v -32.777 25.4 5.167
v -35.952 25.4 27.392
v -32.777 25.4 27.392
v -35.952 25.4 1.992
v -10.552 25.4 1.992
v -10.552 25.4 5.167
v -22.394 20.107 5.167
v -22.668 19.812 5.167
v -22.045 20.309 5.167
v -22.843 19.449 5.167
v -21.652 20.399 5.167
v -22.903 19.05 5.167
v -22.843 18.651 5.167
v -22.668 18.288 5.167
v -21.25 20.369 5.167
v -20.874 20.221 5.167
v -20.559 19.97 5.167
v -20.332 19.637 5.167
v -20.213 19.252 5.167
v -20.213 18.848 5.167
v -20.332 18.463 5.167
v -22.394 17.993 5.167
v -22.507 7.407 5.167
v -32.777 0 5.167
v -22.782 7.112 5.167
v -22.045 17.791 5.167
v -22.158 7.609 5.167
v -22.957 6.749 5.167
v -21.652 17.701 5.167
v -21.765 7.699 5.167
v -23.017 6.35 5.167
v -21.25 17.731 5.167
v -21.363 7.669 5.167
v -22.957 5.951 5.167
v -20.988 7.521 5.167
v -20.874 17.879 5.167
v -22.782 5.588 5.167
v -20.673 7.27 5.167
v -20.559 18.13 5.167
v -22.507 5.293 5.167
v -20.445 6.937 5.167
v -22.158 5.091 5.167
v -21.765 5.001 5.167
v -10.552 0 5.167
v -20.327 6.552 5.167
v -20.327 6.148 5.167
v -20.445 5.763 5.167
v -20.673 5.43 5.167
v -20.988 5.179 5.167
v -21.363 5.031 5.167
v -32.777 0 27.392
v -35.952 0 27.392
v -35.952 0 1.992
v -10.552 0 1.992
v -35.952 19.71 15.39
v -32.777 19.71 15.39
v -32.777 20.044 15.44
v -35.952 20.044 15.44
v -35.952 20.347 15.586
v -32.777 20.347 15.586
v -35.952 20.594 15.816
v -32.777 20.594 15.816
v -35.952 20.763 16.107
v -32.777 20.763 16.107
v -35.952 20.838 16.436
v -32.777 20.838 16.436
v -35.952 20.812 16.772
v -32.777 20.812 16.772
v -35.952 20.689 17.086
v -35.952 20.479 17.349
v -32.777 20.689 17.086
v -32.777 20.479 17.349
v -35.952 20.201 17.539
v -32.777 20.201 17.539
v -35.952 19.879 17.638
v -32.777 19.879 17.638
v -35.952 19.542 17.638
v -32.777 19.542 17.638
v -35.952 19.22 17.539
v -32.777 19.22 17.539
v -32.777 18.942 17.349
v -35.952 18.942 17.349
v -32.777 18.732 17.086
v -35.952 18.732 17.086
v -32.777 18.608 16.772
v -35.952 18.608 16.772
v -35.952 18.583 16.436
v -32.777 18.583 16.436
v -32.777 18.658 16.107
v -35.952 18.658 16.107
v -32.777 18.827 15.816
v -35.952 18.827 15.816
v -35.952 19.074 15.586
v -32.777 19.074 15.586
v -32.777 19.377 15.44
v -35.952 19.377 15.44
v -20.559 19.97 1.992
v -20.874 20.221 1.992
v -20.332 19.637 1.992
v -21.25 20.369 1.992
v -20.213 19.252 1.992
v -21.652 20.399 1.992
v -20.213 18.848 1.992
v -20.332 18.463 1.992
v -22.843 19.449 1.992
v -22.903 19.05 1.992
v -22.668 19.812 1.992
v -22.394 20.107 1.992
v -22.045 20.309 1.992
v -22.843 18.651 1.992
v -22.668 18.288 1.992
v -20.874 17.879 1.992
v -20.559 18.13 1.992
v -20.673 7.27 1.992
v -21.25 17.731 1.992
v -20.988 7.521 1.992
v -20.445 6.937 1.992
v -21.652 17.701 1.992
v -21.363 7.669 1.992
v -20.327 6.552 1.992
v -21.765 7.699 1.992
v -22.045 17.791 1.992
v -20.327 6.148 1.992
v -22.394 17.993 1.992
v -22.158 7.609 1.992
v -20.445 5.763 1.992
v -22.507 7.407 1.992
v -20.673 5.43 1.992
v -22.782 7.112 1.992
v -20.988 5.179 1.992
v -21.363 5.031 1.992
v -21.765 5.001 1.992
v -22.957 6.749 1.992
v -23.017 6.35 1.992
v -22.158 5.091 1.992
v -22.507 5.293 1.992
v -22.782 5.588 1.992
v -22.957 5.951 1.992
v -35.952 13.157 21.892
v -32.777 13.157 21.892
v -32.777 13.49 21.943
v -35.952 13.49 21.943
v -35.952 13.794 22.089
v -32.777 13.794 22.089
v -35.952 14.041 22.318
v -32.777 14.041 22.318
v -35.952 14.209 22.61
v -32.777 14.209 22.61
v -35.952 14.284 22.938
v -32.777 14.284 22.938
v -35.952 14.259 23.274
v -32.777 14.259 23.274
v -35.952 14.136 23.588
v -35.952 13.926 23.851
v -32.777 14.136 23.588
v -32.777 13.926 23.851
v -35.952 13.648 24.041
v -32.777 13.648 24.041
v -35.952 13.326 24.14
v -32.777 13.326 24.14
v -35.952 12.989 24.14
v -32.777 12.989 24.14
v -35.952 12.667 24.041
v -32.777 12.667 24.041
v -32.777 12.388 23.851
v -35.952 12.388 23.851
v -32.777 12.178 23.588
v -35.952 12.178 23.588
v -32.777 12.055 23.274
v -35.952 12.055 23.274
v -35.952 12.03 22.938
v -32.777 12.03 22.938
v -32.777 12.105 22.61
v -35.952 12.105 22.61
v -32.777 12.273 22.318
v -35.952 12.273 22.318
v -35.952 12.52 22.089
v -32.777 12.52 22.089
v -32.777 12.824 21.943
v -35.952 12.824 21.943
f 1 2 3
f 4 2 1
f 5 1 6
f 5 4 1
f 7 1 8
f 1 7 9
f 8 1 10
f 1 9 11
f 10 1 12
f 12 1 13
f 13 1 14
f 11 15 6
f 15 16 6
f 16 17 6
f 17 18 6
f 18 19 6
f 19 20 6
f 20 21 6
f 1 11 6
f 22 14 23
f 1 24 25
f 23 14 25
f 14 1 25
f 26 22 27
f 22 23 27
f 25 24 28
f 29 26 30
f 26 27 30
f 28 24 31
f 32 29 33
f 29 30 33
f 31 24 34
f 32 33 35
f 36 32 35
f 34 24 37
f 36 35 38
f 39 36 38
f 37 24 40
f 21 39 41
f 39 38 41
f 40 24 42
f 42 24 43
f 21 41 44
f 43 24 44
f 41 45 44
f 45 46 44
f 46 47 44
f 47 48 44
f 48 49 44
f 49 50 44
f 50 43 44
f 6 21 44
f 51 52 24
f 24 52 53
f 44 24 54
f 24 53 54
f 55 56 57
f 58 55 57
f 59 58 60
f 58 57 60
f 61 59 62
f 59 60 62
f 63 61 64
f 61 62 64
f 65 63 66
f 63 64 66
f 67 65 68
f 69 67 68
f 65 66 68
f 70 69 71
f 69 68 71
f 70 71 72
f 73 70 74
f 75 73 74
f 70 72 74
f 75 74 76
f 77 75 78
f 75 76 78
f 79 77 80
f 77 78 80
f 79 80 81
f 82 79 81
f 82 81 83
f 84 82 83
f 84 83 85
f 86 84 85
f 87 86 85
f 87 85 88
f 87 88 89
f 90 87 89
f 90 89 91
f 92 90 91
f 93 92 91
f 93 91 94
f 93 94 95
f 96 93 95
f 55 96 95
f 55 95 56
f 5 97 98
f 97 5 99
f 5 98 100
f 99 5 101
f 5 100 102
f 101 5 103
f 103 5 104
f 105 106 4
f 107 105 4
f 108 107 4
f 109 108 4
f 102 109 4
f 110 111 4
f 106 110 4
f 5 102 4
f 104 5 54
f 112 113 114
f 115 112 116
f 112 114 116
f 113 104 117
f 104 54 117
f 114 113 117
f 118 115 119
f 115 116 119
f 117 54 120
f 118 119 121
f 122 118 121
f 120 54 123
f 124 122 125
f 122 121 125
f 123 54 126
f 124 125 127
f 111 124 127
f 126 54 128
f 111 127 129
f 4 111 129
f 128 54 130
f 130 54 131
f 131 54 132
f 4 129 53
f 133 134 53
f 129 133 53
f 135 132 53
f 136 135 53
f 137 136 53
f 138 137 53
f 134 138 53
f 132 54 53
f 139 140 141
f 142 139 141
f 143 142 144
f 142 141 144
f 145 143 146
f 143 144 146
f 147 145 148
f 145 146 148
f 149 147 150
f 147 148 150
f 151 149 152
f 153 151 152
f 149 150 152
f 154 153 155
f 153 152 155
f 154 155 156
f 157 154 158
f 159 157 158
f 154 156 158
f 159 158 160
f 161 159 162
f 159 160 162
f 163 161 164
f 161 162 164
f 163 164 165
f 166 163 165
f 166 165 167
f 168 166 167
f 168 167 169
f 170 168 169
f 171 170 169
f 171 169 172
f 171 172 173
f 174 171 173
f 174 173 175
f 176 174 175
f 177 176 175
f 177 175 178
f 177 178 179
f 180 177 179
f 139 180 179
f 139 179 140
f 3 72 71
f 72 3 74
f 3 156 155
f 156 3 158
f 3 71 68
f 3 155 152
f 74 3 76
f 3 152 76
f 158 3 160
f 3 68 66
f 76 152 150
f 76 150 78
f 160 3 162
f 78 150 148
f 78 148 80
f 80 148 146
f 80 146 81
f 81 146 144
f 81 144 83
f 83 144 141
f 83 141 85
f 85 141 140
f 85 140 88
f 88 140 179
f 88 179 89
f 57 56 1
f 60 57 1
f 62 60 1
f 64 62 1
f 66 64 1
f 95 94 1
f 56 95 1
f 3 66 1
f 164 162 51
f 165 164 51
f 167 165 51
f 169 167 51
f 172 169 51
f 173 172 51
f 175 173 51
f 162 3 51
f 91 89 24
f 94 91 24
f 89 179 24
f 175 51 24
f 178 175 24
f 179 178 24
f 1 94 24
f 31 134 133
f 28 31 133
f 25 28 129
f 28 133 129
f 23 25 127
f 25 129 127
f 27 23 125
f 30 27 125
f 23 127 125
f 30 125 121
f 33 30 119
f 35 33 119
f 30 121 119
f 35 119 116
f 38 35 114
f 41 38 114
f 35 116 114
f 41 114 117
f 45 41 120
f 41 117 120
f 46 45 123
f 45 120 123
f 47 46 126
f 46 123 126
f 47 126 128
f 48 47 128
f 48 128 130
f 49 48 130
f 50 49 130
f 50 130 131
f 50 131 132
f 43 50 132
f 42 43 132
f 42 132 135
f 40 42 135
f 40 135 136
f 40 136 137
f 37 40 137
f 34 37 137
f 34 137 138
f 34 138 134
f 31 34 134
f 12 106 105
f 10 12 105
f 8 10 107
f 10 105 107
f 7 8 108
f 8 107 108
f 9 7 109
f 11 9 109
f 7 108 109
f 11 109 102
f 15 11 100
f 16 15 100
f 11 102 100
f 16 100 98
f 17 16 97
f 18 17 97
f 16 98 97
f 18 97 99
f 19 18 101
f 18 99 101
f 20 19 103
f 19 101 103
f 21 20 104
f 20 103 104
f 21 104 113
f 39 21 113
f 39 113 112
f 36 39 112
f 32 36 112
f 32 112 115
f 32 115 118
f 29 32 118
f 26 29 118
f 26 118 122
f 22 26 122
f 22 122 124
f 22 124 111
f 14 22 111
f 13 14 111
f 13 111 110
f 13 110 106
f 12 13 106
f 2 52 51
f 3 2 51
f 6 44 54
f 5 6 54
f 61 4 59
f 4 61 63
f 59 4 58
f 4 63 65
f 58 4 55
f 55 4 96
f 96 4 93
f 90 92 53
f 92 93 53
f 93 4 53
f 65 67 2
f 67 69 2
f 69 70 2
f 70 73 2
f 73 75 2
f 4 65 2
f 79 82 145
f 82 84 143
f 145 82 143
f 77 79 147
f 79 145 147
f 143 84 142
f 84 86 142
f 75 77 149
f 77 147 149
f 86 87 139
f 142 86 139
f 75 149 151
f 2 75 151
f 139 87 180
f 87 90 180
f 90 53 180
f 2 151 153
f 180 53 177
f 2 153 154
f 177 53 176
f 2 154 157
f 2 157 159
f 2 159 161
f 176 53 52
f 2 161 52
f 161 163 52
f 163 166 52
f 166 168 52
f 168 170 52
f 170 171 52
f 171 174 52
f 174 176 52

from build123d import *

# Parameters (mm, degrees)
BOSS_EXTRUDE2_DEPTH           = 25.4
TAP_DRILL_FOR_4_40_TAP1_D     = 2.2606
TAP_DRILL_FOR_4_40_TAP1_DEPTH = 3.302
TAP_DRILL_FOR_4_40_TAP1_TIP   = 0.679152758
TAP_DRILL_FOR_6_32_TAP1_D     = 2.7051
TAP_DRILL_FOR_6_32_TAP1_DEPTH = 3.302
TAP_DRILL_FOR_6_32_TAP1_TIP   = 0.81269403


with BuildPart() as part:
    # Sketch1 → Boss-Extrude2 (new body)
    with BuildSketch(Plane(origin=(0, 0, 0), x_dir=(1, 0, 0), z_dir=(0, 1, 0))):
        Polygon((-35.951603547, -27.391556999), (-32.776603547, -27.391556999), (-32.776603547, -5.166556999), (-10.551603547, -5.166556999), (-10.551603547, -1.991556999), (-35.951603547, -1.991556999), align=None)
    extrude(amount=BOSS_EXTRUDE2_DEPTH)

    # Tap Drill for #4-40 Tap1
    with Locations(Plane.ZY.offset(35.951603547)):
        with Locations((16.520356999, 19.7104), (23.022756999, 13.1572)):
            Hole(TAP_DRILL_FOR_4_40_TAP1_D / 2, depth=TAP_DRILL_FOR_4_40_TAP1_DEPTH)
            with Locations((0, 0, -(TAP_DRILL_FOR_4_40_TAP1_DEPTH + TAP_DRILL_FOR_4_40_TAP1_TIP / 2))):  # 118° drill point
                Cone(0, TAP_DRILL_FOR_4_40_TAP1_D / 2, TAP_DRILL_FOR_4_40_TAP1_TIP, mode=Mode.SUBTRACT)

    # Tap Drill for #6-32 Tap1
    with Locations(Plane(origin=(-21.664103547, 6.35, 5.166556999), x_dir=(1, 0, 0), z_dir=(0, 0, 1))):
        with Locations((0, 0), (0.113463967, 12.7)):
            Hole(TAP_DRILL_FOR_6_32_TAP1_D / 2, depth=TAP_DRILL_FOR_6_32_TAP1_DEPTH)
            with Locations((0, 0, -(TAP_DRILL_FOR_6_32_TAP1_DEPTH + TAP_DRILL_FOR_6_32_TAP1_TIP / 2))):  # 118° drill point
                Cone(0, TAP_DRILL_FOR_6_32_TAP1_D / 2, TAP_DRILL_FOR_6_32_TAP1_TIP, mode=Mode.SUBTRACT)


solid = part.part
